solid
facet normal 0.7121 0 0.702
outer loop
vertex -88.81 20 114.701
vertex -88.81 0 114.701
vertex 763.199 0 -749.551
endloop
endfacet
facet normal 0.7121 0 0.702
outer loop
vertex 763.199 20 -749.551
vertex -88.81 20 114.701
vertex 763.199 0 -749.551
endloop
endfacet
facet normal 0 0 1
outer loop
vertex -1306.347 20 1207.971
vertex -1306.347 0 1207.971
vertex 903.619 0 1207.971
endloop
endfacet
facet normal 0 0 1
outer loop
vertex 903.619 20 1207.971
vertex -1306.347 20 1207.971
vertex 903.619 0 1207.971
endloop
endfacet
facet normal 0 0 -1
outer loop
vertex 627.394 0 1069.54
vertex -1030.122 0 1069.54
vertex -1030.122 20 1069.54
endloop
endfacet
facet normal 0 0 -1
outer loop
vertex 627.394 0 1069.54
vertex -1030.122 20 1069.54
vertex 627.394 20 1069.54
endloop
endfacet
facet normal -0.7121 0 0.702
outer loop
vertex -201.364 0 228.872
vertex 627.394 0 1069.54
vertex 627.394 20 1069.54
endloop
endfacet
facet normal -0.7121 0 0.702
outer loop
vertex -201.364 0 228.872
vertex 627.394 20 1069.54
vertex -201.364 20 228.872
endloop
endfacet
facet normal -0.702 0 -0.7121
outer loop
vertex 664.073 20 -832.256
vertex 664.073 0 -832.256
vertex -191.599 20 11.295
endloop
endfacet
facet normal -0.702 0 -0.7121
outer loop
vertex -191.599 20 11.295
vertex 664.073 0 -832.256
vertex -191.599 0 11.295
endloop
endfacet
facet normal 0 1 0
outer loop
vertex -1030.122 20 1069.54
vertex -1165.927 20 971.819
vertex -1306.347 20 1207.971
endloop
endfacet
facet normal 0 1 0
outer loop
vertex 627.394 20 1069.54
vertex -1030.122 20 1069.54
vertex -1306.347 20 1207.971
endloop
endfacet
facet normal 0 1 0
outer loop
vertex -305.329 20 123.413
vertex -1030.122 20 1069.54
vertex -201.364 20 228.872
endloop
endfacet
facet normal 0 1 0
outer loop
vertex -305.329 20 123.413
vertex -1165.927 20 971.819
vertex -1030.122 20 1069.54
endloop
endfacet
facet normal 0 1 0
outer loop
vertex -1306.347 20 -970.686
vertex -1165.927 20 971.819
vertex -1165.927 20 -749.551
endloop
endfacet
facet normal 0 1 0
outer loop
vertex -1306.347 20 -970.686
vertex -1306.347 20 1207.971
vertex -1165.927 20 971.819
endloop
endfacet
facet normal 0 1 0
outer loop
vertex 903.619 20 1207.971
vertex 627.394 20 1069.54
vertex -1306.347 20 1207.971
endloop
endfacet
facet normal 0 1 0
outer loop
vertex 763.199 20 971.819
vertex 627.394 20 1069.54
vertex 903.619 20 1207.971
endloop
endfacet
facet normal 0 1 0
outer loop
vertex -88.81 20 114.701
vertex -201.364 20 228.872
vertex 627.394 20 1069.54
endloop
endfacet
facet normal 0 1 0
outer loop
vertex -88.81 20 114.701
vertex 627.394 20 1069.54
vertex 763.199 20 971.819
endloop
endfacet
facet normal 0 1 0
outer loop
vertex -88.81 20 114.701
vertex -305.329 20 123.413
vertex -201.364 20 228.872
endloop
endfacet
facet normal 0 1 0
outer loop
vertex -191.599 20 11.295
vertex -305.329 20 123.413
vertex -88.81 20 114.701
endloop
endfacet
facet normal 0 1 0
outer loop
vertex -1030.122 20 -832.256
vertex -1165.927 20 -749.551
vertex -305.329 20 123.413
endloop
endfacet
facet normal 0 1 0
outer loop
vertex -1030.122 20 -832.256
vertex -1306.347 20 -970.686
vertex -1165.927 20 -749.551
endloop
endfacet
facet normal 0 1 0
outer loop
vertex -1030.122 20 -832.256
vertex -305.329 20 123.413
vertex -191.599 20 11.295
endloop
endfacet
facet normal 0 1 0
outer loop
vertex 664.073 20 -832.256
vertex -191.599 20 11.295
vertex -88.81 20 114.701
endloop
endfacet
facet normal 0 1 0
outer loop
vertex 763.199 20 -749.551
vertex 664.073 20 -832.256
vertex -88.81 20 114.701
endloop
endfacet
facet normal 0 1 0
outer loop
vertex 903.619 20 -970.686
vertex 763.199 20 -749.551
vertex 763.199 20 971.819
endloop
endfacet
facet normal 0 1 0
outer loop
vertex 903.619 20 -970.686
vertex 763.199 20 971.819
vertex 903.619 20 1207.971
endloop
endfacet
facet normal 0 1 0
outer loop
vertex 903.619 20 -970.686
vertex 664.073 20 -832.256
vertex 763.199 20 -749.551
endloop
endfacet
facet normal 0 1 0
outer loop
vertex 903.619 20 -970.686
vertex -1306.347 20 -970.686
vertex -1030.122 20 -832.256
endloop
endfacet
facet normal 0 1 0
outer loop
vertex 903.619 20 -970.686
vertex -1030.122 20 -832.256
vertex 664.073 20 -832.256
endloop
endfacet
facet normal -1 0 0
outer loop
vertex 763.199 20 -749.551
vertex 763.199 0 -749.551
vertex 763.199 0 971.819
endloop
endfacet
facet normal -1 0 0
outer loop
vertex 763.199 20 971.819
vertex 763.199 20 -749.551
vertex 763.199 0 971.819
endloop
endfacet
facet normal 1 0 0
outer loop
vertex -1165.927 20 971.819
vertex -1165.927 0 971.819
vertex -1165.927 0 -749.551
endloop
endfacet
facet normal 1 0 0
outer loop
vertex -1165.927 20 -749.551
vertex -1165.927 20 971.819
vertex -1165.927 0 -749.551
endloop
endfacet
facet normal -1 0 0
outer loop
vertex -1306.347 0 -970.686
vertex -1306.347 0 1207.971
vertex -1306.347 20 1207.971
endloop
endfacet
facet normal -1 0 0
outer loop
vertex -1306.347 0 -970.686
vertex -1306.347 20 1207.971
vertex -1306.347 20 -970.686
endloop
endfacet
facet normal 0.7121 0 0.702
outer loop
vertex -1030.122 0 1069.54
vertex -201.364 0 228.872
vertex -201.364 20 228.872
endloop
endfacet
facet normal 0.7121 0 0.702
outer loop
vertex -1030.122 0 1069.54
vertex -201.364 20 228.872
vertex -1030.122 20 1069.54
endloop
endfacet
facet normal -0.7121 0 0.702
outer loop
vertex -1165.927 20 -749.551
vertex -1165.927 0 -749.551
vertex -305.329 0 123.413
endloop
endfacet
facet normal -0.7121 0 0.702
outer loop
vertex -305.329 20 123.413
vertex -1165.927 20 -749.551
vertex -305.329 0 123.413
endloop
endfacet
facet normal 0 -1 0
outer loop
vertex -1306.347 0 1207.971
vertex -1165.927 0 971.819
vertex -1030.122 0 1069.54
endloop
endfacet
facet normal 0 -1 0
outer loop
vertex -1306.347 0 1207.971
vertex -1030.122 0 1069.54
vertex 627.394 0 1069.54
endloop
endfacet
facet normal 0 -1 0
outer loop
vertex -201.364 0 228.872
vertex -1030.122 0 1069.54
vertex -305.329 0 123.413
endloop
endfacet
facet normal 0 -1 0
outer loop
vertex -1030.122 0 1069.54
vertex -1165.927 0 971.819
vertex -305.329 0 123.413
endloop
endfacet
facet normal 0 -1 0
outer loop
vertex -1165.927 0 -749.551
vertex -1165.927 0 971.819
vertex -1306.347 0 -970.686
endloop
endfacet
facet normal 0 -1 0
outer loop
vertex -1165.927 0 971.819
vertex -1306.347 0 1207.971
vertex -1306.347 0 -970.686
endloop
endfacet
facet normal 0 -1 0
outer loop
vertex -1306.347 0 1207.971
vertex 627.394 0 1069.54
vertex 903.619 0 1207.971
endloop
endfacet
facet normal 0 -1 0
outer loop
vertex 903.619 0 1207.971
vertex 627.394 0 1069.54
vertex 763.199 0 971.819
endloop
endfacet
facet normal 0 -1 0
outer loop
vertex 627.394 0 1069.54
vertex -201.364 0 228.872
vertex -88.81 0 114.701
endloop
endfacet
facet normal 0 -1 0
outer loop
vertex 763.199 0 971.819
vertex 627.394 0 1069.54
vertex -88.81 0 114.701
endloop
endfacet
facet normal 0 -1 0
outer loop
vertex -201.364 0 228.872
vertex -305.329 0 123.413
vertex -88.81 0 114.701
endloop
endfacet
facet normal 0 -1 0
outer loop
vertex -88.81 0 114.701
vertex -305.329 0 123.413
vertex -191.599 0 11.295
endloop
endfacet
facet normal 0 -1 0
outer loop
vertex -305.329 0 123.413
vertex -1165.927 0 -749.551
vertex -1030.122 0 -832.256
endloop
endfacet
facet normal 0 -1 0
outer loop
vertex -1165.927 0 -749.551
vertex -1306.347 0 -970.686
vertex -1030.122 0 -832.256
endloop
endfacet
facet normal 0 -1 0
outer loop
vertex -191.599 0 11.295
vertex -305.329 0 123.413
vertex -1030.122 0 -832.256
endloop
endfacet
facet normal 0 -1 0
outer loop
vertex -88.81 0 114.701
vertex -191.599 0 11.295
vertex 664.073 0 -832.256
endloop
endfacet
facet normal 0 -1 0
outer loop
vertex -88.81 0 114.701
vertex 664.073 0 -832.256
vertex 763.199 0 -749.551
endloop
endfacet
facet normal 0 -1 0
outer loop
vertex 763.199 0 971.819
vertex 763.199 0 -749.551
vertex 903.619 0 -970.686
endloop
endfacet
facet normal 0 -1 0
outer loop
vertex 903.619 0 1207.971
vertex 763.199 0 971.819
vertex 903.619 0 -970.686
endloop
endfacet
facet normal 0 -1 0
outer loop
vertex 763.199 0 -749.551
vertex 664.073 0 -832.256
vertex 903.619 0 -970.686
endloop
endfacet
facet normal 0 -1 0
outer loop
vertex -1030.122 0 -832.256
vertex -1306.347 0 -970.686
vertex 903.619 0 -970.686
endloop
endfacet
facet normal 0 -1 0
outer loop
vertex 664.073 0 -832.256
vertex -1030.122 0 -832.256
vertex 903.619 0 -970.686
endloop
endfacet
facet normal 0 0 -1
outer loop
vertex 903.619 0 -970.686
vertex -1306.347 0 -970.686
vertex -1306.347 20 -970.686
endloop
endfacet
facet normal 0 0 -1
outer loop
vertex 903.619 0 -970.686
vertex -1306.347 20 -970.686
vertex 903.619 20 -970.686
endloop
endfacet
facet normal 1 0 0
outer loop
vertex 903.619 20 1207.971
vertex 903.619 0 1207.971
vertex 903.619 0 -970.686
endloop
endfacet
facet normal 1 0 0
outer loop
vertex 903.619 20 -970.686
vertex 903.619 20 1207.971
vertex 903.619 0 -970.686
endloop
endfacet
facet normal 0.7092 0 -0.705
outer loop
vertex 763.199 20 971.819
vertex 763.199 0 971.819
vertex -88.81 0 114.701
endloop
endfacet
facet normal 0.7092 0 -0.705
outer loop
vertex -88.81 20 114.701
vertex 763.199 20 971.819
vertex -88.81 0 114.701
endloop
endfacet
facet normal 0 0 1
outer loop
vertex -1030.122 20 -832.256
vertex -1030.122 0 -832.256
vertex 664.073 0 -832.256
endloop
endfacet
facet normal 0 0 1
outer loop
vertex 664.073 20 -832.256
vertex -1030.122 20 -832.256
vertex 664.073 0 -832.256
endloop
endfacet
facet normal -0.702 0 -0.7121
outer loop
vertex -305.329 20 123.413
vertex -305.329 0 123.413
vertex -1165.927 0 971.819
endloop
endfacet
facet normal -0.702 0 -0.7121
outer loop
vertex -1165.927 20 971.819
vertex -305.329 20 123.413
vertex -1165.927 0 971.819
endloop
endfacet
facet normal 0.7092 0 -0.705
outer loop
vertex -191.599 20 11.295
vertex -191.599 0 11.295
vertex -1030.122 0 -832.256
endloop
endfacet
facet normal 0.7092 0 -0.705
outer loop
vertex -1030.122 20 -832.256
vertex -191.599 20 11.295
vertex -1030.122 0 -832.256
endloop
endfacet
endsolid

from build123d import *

# Parameters (mm, degrees)
SKETCH_5_W      = 2209.965574324
SKETCH_5_H      = 2178.657088224
EXTRUDE_1_DEPTH = 20


with BuildPart() as part:
    # 草图5 → 凸台-拉伸1 (new body)
    with BuildSketch(Plane(origin=(0, 0, 0), x_dir=(1, 0, 0), z_dir=(0, 1, 0))):
        with Locations((-201.363960341, -118.642097246)):
            Rectangle(SKETCH_5_W, SKETCH_5_H)
        Polygon((-1165.926599204, 749.551468133), (-305.329028983, -123.413356765), (-1165.926599204, -971.818878667), align=None, mode=Mode.SUBTRACT)
        Polygon((-1030.12162171, 832.255624695), (664.07343499, 832.255624695), (-191.599463217, -11.294992808), align=None, mode=Mode.SUBTRACT)
        Polygon((-88.80991437, -114.700951165), (763.198678521, 749.551468133), (763.198678521, -971.818878667), align=None, mode=Mode.SUBTRACT)
        Polygon((-201.363960341, -228.872459931), (-1030.12162171, -1069.539819188), (627.393701027, -1069.539819188), align=None, mode=Mode.SUBTRACT)
    extrude(amount=EXTRUDE_1_DEPTH)


solid = part.part
